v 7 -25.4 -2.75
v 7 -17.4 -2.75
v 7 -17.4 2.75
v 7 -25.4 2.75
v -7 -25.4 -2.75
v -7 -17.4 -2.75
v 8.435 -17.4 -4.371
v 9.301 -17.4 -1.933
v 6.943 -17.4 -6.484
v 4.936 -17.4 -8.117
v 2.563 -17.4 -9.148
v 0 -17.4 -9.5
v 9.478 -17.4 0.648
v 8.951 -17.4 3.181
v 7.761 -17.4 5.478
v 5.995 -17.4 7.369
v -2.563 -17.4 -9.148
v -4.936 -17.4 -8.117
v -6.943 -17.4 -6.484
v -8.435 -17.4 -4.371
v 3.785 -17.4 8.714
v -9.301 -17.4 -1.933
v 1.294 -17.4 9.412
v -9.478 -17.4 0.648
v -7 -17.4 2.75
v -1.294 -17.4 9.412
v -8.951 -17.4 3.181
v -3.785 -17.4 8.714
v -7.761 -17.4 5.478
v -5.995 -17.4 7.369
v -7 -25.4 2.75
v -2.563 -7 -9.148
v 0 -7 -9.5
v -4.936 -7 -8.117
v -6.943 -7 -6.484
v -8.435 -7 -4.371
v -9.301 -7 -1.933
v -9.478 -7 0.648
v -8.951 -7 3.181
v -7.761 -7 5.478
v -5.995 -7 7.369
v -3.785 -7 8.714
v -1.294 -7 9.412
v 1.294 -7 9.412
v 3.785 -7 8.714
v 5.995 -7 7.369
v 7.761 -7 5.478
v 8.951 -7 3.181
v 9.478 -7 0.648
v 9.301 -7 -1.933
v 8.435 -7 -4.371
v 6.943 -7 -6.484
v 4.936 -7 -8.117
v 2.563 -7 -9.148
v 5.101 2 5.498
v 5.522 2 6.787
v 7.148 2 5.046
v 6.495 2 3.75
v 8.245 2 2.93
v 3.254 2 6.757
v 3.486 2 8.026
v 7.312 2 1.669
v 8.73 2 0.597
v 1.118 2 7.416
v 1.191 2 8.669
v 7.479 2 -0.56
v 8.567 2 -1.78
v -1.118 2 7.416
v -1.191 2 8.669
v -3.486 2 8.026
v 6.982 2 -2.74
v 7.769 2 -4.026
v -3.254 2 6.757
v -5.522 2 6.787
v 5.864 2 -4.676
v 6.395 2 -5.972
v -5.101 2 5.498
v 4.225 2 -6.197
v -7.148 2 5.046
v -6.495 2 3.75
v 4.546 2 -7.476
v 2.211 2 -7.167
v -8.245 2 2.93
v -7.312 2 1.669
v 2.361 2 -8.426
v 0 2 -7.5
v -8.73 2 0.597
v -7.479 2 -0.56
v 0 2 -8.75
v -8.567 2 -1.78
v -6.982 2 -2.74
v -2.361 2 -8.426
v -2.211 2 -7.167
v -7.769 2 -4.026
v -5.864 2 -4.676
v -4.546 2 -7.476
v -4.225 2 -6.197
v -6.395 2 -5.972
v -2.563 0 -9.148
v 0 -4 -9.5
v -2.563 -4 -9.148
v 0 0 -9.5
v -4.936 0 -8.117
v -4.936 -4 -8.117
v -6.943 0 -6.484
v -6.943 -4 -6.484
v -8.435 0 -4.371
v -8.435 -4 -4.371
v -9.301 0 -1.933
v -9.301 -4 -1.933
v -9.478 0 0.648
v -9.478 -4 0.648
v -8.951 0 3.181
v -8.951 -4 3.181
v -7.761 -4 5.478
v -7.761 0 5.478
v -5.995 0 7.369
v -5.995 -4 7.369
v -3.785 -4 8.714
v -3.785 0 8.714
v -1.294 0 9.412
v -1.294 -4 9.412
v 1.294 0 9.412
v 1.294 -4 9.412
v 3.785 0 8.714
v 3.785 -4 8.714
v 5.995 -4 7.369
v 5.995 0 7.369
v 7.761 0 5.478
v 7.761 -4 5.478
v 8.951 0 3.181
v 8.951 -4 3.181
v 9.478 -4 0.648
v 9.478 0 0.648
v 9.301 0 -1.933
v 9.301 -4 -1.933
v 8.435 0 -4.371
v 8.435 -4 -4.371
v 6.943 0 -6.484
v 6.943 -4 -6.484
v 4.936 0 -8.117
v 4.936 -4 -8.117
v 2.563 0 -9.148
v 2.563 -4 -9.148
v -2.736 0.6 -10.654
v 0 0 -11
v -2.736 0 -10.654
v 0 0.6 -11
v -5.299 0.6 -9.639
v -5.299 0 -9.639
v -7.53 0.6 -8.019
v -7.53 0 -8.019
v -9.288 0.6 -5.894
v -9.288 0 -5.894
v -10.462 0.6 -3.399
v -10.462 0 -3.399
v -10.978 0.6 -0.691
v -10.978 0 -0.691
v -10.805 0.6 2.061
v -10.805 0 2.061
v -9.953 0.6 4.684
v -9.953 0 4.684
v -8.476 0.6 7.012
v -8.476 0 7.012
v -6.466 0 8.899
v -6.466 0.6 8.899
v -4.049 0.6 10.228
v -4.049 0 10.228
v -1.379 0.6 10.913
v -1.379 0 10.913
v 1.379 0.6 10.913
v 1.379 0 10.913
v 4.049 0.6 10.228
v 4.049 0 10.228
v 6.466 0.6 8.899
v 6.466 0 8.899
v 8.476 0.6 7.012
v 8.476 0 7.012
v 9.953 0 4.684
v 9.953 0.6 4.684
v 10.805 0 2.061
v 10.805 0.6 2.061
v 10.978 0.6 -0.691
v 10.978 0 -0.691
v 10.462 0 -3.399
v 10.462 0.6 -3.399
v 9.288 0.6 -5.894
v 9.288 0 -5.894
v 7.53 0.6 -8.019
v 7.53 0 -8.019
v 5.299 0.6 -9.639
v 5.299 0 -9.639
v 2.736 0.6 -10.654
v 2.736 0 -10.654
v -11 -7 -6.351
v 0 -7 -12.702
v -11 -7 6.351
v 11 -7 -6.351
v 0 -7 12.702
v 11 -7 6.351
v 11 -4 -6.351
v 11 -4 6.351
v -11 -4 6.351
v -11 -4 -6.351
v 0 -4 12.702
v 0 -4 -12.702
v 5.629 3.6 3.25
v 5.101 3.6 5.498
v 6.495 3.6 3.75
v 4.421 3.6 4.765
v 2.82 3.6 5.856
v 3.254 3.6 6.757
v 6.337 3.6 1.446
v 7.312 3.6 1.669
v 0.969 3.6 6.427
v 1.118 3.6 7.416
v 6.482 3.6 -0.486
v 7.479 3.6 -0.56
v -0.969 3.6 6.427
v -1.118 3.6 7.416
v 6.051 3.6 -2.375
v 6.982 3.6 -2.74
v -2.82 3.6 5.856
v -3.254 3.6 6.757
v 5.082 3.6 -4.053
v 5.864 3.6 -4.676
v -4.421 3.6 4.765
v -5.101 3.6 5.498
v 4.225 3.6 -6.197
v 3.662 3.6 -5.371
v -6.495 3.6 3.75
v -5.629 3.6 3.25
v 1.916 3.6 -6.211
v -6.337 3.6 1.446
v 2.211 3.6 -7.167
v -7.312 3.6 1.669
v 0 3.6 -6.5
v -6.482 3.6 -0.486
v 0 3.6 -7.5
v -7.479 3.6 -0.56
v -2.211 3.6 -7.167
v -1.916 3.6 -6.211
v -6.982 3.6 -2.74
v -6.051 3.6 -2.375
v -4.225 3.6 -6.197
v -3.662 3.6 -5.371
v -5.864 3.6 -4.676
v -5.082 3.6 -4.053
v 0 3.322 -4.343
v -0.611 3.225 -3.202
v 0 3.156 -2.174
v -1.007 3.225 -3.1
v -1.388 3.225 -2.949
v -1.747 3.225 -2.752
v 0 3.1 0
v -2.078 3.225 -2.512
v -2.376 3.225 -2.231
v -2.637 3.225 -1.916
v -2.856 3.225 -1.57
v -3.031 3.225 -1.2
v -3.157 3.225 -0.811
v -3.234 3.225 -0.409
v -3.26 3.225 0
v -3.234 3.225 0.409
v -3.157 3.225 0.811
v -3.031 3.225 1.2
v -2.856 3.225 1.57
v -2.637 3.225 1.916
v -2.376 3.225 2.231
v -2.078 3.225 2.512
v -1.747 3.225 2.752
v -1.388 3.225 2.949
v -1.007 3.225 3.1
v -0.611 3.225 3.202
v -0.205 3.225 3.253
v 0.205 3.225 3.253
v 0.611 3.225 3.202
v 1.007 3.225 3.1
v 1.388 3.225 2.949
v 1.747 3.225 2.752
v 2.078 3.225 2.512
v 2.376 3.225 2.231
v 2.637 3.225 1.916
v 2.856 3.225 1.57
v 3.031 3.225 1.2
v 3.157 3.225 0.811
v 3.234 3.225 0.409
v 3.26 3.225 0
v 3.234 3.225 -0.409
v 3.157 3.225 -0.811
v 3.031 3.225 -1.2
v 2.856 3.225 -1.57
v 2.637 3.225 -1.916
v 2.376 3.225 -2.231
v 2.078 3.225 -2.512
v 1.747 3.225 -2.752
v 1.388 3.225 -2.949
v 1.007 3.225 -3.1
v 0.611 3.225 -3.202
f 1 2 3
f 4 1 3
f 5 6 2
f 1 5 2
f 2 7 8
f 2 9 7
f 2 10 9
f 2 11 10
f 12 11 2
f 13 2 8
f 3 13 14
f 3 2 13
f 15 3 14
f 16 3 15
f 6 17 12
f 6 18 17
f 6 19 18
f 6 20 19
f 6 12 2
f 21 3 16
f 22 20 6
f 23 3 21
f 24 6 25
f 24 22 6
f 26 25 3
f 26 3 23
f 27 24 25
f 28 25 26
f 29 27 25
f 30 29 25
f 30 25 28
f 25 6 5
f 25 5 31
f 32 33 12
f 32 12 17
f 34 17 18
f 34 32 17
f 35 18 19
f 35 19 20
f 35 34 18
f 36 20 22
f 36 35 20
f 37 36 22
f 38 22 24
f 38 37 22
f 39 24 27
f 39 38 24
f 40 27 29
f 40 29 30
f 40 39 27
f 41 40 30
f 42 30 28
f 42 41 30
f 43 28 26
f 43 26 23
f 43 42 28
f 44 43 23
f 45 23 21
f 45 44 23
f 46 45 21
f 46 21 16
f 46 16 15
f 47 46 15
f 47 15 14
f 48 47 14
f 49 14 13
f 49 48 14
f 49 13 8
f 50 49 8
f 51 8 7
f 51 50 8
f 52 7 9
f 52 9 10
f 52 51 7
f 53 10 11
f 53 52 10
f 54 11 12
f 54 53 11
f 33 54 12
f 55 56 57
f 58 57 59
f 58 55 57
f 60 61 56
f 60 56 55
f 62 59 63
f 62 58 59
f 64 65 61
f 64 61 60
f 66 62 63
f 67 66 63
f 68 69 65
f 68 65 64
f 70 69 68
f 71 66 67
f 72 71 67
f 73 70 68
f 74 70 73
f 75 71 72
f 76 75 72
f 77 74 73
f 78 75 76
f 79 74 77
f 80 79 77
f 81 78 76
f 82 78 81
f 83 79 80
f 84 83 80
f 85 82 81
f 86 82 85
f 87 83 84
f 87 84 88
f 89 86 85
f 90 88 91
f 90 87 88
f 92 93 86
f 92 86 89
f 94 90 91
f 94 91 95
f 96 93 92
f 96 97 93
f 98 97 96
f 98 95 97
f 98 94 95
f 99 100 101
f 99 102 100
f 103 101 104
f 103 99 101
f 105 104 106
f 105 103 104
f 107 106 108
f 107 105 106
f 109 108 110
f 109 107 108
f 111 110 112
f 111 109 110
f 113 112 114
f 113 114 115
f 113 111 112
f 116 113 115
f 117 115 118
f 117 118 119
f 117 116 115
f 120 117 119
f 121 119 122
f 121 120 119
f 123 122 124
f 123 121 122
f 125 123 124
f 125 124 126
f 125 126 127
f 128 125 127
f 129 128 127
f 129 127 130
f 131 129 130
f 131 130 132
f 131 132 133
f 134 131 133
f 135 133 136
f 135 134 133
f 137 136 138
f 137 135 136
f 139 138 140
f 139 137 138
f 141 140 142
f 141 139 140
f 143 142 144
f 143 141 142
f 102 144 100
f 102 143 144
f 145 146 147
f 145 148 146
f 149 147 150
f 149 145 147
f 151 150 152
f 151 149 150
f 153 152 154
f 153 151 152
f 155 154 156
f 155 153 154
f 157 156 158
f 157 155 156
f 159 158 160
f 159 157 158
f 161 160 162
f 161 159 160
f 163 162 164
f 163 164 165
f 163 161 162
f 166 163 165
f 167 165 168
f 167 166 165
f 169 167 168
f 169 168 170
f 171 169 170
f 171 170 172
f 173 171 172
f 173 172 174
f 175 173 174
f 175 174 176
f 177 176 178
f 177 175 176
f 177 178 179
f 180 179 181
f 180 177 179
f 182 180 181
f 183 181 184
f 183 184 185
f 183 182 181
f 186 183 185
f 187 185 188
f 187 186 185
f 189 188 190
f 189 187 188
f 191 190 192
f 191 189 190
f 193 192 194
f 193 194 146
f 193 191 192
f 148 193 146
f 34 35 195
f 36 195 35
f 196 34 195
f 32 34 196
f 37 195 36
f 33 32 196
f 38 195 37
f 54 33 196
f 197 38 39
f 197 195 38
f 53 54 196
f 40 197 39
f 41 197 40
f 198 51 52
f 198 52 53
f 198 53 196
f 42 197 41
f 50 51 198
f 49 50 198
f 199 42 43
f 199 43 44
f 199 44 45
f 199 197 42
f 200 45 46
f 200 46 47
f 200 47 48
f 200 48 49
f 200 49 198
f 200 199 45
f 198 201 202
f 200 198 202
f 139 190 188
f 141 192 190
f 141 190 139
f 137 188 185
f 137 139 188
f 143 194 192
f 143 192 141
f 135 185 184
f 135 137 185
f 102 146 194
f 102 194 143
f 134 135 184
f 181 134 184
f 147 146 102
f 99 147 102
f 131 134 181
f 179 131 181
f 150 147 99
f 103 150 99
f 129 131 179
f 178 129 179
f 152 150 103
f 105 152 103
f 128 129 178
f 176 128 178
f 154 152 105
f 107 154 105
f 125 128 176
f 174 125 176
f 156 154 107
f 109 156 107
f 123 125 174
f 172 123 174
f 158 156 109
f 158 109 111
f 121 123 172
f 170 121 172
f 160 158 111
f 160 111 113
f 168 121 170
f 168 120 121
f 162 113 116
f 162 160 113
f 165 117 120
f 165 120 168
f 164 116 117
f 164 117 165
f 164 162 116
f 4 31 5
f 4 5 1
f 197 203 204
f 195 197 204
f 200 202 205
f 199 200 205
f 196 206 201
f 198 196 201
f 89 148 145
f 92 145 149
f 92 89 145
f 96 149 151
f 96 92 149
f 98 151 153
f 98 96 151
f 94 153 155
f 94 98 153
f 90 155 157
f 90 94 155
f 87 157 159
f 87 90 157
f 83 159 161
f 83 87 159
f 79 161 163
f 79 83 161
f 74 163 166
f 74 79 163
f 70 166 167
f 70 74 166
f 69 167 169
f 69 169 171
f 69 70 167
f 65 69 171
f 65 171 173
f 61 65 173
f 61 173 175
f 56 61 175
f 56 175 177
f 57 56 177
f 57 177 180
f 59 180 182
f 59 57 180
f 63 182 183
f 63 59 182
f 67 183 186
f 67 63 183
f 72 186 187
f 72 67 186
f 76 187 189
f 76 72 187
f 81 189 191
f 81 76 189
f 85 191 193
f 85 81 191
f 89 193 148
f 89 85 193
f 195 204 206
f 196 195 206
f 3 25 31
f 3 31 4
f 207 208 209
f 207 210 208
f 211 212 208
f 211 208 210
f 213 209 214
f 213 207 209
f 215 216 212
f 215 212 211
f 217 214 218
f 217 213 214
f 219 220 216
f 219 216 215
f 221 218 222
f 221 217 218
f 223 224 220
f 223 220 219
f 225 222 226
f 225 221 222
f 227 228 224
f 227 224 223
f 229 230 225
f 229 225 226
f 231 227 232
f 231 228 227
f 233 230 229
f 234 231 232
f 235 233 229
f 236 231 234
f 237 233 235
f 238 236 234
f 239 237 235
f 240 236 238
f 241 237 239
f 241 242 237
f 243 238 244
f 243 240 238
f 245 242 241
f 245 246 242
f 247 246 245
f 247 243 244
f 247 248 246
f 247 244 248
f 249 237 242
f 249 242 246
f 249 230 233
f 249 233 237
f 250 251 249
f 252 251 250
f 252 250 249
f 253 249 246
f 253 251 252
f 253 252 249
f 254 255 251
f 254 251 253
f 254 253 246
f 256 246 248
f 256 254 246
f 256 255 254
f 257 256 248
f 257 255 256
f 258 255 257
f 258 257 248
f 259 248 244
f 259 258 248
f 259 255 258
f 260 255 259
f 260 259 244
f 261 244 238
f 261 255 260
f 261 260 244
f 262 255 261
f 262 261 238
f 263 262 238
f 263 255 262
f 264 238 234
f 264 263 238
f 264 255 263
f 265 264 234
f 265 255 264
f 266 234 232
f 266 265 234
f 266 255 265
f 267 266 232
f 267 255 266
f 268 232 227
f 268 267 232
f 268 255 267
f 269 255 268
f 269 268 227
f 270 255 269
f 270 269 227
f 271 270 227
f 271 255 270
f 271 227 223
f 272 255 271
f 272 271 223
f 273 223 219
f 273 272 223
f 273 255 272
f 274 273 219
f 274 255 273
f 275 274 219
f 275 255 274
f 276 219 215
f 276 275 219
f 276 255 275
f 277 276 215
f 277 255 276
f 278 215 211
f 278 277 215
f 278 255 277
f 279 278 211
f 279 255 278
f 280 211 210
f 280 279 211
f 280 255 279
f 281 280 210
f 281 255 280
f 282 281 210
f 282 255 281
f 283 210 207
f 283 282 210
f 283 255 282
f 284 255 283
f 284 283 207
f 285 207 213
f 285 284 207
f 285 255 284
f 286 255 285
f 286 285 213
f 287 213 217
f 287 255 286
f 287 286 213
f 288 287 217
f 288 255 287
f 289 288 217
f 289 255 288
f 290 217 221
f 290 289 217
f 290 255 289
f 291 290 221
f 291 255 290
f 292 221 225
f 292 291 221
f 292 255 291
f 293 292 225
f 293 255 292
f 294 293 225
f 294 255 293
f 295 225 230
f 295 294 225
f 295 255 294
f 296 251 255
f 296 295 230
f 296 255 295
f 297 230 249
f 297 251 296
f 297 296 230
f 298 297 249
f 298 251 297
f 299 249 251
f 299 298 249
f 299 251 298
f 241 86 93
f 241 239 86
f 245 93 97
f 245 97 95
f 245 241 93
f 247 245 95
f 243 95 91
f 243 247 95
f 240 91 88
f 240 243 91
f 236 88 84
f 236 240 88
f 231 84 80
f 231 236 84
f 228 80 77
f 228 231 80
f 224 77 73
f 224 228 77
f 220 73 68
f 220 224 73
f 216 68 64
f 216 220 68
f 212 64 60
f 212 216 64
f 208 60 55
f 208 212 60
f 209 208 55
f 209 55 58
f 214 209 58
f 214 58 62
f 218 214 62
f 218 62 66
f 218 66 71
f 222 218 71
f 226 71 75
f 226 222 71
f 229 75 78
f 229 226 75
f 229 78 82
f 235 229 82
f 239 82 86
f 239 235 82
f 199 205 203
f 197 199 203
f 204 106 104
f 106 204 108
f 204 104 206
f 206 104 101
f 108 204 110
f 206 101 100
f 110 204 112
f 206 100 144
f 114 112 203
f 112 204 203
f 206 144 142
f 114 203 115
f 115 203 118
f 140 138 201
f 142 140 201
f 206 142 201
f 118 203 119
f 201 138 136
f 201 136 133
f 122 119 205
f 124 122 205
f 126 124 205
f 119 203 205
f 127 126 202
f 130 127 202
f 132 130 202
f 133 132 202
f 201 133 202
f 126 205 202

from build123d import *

# Parameters (mm, degrees)
SKETCH2_W           = 14
SKETCH2_H           = 5.5
BOSS_EXTRUDE1_DEPTH = 8
BOSS_EXTRUDE2_START = 4
BOSS_EXTRUDE2_DEPTH = 3


with BuildPart() as part:
    # Sketch1 → Revolve1 (revolve)
    with BuildSketch(Plane.XY, mode=Mode.PRIVATE) as revolve1_sk:
        with BuildLine():
            Line((9.5, 0), (11, 0))
            Line((11, 0), (11, 0.6))
            Line((11, 0.6), (8.75, 2))
            Line((8.75, 2), (7.5, 2))
            Line((7.5, 2), (7.5, 3.6))
            Line((7.5, 3.6), (6.5, 3.6))
            ThreePointArc((6.5, 3.6), (3.259601203, 3.225184366), (0, 3.1))
            Line((0, 3.1), (0, -17.4))
            Line((0, -17.4), (9.5, -17.4))
            Line((9.5, -17.4), (9.5, 0))
        make_face()
    revolve(revolve1_sk.sketch.rotate(Axis((0, 3.6, 0), (0, 1, 0)), 90), axis=Axis((0, 3.6, 0), (0, 1, 0)))

    # Sketch2 → Boss-Extrude1 (add)
    with BuildSketch(Plane.XZ.offset(17.4)):
        Rectangle(SKETCH2_W, SKETCH2_H)
    extrude(amount=BOSS_EXTRUDE1_DEPTH)

    # Sketch3 → Boss-Extrude2 (add)
    with BuildSketch(Plane.XZ.offset(BOSS_EXTRUDE2_START)):
        Polygon((0, 12.701705922), (-11, 6.350852961), (-11, -6.350852961), (0, -12.701705922), (11, -6.350852961), (11, 6.350852961), align=None)
    extrude(amount=BOSS_EXTRUDE2_DEPTH)


solid = part.part
